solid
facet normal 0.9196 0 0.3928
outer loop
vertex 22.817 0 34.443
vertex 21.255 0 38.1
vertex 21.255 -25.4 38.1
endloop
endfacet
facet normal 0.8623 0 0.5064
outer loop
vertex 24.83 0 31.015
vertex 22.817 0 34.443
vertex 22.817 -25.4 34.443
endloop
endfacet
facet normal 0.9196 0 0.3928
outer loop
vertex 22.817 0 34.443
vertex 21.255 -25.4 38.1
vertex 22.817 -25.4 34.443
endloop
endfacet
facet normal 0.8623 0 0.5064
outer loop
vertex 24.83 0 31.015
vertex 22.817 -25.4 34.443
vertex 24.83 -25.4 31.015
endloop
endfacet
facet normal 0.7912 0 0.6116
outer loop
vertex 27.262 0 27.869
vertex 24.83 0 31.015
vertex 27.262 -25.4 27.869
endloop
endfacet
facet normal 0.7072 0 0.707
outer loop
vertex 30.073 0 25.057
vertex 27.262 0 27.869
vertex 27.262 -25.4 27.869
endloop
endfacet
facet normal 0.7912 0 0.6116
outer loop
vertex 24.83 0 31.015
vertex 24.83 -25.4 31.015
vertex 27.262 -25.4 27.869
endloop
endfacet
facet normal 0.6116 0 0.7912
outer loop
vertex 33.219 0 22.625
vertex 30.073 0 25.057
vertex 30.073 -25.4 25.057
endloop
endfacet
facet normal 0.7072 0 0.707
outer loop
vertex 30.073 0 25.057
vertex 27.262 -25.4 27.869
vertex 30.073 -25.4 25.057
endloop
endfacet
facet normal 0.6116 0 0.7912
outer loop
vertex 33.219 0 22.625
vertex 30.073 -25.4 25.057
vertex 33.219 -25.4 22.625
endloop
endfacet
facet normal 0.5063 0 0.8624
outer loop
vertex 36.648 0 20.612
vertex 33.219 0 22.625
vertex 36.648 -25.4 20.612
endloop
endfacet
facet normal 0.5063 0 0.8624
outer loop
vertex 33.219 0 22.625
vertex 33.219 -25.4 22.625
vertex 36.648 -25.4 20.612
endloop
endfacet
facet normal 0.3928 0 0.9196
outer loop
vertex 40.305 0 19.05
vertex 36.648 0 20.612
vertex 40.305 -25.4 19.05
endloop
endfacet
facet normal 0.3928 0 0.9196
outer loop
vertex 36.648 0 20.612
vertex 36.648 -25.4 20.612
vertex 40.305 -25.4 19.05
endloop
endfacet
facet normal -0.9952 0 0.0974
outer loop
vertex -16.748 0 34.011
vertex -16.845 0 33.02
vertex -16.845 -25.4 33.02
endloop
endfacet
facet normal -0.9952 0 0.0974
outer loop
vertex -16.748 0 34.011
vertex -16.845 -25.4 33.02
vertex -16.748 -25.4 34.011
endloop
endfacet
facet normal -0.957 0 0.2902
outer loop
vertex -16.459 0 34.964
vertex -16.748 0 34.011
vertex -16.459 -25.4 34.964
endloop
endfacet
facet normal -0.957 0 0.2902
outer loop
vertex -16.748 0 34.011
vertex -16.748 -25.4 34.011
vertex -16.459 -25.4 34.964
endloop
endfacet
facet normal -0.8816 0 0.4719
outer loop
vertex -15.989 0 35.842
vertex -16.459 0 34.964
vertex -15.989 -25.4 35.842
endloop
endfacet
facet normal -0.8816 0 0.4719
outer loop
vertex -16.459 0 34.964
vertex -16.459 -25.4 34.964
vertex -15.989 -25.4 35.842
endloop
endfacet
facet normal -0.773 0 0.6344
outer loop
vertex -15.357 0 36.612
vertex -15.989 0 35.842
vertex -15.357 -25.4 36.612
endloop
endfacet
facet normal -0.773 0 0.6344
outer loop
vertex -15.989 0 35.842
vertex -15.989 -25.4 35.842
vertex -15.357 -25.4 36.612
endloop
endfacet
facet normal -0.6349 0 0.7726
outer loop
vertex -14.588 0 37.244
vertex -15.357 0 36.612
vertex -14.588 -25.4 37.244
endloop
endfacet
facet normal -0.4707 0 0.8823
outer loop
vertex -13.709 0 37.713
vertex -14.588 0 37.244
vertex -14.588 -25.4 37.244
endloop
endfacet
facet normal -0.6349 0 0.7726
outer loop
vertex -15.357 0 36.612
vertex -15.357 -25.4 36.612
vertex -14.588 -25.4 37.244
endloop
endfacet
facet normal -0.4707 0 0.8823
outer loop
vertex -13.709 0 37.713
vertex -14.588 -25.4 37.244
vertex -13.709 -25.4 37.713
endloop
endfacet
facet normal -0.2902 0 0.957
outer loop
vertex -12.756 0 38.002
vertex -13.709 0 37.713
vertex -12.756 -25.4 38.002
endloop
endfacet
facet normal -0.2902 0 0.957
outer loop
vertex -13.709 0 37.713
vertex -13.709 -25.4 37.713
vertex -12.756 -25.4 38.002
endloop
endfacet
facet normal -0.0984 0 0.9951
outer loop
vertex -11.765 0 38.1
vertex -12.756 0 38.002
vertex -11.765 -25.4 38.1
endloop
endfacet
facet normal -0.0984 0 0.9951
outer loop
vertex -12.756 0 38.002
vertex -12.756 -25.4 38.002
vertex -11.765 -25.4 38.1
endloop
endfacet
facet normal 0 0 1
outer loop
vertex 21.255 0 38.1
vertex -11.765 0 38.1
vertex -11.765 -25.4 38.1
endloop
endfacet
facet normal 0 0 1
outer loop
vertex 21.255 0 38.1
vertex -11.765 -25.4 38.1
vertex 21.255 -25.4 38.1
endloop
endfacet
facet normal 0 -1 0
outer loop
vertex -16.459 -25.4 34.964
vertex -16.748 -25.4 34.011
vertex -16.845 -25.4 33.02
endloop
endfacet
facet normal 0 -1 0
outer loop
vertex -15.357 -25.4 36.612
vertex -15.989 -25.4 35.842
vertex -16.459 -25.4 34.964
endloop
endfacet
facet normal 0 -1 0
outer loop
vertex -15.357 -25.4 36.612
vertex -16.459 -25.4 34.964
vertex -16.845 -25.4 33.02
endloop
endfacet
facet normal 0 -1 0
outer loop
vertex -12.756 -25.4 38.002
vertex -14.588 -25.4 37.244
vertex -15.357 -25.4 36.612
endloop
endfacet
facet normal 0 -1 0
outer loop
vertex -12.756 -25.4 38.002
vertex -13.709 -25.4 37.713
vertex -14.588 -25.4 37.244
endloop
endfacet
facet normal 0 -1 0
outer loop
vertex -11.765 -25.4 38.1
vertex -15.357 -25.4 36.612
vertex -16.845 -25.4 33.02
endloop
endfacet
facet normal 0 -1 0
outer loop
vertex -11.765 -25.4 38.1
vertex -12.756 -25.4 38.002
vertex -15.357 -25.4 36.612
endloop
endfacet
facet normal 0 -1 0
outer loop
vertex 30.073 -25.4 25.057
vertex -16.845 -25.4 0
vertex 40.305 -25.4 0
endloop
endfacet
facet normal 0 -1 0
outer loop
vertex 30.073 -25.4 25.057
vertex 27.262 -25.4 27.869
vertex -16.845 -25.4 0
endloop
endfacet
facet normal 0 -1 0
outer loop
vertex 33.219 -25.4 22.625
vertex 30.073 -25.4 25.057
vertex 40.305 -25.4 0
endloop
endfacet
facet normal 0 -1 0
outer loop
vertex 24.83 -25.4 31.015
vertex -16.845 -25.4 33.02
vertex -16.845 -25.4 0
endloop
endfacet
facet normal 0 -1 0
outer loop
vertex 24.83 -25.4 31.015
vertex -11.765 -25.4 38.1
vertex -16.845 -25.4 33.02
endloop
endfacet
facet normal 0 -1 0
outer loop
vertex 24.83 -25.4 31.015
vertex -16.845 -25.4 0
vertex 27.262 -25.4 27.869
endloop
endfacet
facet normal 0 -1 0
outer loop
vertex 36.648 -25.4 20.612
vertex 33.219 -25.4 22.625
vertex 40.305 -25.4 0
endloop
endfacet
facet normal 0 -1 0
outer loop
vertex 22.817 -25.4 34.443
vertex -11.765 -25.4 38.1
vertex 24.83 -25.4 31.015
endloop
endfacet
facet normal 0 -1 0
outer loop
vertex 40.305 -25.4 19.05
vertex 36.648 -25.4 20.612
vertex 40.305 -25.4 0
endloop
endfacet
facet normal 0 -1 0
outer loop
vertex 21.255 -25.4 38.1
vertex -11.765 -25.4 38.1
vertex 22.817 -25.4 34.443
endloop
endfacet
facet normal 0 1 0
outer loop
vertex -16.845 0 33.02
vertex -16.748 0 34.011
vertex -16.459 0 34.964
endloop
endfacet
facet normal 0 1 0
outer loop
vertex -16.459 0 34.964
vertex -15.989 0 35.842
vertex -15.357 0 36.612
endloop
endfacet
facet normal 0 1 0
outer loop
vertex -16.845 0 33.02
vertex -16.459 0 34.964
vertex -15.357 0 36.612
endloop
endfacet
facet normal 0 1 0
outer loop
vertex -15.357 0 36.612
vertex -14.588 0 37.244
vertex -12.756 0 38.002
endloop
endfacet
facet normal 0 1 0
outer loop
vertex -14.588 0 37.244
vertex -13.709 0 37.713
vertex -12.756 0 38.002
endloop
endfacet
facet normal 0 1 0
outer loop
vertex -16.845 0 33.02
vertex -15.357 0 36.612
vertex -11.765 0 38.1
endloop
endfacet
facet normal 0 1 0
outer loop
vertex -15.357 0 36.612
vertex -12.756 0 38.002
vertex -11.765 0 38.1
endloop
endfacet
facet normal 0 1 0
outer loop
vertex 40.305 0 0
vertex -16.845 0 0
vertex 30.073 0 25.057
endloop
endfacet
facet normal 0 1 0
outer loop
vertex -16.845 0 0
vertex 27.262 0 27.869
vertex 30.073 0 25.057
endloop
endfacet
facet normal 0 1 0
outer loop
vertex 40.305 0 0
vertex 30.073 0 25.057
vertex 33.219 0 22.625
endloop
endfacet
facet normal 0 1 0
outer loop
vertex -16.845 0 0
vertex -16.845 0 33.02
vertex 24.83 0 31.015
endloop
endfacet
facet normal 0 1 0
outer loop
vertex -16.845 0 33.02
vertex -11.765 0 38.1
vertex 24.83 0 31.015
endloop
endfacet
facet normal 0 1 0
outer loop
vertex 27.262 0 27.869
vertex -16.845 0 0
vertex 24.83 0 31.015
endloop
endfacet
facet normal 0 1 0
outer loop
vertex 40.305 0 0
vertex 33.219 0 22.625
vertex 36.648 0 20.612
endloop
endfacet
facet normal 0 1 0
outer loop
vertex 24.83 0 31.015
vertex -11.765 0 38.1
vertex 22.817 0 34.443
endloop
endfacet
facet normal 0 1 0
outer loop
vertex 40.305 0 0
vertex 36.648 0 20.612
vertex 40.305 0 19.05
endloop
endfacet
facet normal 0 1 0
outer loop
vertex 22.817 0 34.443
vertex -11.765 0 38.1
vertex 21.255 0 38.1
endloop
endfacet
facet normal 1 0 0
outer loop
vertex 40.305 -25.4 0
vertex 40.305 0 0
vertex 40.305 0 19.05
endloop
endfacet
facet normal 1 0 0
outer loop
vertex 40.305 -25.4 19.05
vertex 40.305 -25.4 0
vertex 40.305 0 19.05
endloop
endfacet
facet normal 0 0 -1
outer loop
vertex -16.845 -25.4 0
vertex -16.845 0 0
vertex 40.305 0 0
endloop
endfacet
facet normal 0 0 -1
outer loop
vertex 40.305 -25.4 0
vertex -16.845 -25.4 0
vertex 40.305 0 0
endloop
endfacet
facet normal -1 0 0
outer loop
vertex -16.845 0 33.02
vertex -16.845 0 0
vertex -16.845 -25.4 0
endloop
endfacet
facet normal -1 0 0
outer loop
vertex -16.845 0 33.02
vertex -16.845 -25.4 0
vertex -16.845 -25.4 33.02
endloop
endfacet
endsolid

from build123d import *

# Parameters (mm, degrees)
F0_W     = 57.15
F0_H     = 38.1
F1_DEPTH = 25.4
F3_DEPTH = 25.4
F4_R     = 5.08


with BuildPart() as f1:
    # F0 (on Front) → F1 (new body)
    with BuildSketch(Plane.XZ):
        with Locations((11.729645, 19.05)):
            Rectangle(F0_W, F0_H)
    extrude(amount=F1_DEPTH)

    # F2 (on face) → F3 (cut)
    with BuildSketch(Plane.XZ.offset(25.4)):
        with BuildLine():
            Line((40.304645, 38.1), (21.254645, 38.1))
            ThreePointArc((21.254645, 38.1), (28.622933, 26.418288), (40.304645, 19.05))
            Line((40.304645, 19.05), (40.304645, 38.1))
        make_face()
    extrude(amount=-F3_DEPTH, mode=Mode.SUBTRACT)

    # F4
    f4_edges = [f1.edges().sort_by_distance(p)[0] for p in [
        (-16.845355, -12.7, 38.1),
    ]]
    fillet(f4_edges, radius=F4_R)


solid = f1.part
